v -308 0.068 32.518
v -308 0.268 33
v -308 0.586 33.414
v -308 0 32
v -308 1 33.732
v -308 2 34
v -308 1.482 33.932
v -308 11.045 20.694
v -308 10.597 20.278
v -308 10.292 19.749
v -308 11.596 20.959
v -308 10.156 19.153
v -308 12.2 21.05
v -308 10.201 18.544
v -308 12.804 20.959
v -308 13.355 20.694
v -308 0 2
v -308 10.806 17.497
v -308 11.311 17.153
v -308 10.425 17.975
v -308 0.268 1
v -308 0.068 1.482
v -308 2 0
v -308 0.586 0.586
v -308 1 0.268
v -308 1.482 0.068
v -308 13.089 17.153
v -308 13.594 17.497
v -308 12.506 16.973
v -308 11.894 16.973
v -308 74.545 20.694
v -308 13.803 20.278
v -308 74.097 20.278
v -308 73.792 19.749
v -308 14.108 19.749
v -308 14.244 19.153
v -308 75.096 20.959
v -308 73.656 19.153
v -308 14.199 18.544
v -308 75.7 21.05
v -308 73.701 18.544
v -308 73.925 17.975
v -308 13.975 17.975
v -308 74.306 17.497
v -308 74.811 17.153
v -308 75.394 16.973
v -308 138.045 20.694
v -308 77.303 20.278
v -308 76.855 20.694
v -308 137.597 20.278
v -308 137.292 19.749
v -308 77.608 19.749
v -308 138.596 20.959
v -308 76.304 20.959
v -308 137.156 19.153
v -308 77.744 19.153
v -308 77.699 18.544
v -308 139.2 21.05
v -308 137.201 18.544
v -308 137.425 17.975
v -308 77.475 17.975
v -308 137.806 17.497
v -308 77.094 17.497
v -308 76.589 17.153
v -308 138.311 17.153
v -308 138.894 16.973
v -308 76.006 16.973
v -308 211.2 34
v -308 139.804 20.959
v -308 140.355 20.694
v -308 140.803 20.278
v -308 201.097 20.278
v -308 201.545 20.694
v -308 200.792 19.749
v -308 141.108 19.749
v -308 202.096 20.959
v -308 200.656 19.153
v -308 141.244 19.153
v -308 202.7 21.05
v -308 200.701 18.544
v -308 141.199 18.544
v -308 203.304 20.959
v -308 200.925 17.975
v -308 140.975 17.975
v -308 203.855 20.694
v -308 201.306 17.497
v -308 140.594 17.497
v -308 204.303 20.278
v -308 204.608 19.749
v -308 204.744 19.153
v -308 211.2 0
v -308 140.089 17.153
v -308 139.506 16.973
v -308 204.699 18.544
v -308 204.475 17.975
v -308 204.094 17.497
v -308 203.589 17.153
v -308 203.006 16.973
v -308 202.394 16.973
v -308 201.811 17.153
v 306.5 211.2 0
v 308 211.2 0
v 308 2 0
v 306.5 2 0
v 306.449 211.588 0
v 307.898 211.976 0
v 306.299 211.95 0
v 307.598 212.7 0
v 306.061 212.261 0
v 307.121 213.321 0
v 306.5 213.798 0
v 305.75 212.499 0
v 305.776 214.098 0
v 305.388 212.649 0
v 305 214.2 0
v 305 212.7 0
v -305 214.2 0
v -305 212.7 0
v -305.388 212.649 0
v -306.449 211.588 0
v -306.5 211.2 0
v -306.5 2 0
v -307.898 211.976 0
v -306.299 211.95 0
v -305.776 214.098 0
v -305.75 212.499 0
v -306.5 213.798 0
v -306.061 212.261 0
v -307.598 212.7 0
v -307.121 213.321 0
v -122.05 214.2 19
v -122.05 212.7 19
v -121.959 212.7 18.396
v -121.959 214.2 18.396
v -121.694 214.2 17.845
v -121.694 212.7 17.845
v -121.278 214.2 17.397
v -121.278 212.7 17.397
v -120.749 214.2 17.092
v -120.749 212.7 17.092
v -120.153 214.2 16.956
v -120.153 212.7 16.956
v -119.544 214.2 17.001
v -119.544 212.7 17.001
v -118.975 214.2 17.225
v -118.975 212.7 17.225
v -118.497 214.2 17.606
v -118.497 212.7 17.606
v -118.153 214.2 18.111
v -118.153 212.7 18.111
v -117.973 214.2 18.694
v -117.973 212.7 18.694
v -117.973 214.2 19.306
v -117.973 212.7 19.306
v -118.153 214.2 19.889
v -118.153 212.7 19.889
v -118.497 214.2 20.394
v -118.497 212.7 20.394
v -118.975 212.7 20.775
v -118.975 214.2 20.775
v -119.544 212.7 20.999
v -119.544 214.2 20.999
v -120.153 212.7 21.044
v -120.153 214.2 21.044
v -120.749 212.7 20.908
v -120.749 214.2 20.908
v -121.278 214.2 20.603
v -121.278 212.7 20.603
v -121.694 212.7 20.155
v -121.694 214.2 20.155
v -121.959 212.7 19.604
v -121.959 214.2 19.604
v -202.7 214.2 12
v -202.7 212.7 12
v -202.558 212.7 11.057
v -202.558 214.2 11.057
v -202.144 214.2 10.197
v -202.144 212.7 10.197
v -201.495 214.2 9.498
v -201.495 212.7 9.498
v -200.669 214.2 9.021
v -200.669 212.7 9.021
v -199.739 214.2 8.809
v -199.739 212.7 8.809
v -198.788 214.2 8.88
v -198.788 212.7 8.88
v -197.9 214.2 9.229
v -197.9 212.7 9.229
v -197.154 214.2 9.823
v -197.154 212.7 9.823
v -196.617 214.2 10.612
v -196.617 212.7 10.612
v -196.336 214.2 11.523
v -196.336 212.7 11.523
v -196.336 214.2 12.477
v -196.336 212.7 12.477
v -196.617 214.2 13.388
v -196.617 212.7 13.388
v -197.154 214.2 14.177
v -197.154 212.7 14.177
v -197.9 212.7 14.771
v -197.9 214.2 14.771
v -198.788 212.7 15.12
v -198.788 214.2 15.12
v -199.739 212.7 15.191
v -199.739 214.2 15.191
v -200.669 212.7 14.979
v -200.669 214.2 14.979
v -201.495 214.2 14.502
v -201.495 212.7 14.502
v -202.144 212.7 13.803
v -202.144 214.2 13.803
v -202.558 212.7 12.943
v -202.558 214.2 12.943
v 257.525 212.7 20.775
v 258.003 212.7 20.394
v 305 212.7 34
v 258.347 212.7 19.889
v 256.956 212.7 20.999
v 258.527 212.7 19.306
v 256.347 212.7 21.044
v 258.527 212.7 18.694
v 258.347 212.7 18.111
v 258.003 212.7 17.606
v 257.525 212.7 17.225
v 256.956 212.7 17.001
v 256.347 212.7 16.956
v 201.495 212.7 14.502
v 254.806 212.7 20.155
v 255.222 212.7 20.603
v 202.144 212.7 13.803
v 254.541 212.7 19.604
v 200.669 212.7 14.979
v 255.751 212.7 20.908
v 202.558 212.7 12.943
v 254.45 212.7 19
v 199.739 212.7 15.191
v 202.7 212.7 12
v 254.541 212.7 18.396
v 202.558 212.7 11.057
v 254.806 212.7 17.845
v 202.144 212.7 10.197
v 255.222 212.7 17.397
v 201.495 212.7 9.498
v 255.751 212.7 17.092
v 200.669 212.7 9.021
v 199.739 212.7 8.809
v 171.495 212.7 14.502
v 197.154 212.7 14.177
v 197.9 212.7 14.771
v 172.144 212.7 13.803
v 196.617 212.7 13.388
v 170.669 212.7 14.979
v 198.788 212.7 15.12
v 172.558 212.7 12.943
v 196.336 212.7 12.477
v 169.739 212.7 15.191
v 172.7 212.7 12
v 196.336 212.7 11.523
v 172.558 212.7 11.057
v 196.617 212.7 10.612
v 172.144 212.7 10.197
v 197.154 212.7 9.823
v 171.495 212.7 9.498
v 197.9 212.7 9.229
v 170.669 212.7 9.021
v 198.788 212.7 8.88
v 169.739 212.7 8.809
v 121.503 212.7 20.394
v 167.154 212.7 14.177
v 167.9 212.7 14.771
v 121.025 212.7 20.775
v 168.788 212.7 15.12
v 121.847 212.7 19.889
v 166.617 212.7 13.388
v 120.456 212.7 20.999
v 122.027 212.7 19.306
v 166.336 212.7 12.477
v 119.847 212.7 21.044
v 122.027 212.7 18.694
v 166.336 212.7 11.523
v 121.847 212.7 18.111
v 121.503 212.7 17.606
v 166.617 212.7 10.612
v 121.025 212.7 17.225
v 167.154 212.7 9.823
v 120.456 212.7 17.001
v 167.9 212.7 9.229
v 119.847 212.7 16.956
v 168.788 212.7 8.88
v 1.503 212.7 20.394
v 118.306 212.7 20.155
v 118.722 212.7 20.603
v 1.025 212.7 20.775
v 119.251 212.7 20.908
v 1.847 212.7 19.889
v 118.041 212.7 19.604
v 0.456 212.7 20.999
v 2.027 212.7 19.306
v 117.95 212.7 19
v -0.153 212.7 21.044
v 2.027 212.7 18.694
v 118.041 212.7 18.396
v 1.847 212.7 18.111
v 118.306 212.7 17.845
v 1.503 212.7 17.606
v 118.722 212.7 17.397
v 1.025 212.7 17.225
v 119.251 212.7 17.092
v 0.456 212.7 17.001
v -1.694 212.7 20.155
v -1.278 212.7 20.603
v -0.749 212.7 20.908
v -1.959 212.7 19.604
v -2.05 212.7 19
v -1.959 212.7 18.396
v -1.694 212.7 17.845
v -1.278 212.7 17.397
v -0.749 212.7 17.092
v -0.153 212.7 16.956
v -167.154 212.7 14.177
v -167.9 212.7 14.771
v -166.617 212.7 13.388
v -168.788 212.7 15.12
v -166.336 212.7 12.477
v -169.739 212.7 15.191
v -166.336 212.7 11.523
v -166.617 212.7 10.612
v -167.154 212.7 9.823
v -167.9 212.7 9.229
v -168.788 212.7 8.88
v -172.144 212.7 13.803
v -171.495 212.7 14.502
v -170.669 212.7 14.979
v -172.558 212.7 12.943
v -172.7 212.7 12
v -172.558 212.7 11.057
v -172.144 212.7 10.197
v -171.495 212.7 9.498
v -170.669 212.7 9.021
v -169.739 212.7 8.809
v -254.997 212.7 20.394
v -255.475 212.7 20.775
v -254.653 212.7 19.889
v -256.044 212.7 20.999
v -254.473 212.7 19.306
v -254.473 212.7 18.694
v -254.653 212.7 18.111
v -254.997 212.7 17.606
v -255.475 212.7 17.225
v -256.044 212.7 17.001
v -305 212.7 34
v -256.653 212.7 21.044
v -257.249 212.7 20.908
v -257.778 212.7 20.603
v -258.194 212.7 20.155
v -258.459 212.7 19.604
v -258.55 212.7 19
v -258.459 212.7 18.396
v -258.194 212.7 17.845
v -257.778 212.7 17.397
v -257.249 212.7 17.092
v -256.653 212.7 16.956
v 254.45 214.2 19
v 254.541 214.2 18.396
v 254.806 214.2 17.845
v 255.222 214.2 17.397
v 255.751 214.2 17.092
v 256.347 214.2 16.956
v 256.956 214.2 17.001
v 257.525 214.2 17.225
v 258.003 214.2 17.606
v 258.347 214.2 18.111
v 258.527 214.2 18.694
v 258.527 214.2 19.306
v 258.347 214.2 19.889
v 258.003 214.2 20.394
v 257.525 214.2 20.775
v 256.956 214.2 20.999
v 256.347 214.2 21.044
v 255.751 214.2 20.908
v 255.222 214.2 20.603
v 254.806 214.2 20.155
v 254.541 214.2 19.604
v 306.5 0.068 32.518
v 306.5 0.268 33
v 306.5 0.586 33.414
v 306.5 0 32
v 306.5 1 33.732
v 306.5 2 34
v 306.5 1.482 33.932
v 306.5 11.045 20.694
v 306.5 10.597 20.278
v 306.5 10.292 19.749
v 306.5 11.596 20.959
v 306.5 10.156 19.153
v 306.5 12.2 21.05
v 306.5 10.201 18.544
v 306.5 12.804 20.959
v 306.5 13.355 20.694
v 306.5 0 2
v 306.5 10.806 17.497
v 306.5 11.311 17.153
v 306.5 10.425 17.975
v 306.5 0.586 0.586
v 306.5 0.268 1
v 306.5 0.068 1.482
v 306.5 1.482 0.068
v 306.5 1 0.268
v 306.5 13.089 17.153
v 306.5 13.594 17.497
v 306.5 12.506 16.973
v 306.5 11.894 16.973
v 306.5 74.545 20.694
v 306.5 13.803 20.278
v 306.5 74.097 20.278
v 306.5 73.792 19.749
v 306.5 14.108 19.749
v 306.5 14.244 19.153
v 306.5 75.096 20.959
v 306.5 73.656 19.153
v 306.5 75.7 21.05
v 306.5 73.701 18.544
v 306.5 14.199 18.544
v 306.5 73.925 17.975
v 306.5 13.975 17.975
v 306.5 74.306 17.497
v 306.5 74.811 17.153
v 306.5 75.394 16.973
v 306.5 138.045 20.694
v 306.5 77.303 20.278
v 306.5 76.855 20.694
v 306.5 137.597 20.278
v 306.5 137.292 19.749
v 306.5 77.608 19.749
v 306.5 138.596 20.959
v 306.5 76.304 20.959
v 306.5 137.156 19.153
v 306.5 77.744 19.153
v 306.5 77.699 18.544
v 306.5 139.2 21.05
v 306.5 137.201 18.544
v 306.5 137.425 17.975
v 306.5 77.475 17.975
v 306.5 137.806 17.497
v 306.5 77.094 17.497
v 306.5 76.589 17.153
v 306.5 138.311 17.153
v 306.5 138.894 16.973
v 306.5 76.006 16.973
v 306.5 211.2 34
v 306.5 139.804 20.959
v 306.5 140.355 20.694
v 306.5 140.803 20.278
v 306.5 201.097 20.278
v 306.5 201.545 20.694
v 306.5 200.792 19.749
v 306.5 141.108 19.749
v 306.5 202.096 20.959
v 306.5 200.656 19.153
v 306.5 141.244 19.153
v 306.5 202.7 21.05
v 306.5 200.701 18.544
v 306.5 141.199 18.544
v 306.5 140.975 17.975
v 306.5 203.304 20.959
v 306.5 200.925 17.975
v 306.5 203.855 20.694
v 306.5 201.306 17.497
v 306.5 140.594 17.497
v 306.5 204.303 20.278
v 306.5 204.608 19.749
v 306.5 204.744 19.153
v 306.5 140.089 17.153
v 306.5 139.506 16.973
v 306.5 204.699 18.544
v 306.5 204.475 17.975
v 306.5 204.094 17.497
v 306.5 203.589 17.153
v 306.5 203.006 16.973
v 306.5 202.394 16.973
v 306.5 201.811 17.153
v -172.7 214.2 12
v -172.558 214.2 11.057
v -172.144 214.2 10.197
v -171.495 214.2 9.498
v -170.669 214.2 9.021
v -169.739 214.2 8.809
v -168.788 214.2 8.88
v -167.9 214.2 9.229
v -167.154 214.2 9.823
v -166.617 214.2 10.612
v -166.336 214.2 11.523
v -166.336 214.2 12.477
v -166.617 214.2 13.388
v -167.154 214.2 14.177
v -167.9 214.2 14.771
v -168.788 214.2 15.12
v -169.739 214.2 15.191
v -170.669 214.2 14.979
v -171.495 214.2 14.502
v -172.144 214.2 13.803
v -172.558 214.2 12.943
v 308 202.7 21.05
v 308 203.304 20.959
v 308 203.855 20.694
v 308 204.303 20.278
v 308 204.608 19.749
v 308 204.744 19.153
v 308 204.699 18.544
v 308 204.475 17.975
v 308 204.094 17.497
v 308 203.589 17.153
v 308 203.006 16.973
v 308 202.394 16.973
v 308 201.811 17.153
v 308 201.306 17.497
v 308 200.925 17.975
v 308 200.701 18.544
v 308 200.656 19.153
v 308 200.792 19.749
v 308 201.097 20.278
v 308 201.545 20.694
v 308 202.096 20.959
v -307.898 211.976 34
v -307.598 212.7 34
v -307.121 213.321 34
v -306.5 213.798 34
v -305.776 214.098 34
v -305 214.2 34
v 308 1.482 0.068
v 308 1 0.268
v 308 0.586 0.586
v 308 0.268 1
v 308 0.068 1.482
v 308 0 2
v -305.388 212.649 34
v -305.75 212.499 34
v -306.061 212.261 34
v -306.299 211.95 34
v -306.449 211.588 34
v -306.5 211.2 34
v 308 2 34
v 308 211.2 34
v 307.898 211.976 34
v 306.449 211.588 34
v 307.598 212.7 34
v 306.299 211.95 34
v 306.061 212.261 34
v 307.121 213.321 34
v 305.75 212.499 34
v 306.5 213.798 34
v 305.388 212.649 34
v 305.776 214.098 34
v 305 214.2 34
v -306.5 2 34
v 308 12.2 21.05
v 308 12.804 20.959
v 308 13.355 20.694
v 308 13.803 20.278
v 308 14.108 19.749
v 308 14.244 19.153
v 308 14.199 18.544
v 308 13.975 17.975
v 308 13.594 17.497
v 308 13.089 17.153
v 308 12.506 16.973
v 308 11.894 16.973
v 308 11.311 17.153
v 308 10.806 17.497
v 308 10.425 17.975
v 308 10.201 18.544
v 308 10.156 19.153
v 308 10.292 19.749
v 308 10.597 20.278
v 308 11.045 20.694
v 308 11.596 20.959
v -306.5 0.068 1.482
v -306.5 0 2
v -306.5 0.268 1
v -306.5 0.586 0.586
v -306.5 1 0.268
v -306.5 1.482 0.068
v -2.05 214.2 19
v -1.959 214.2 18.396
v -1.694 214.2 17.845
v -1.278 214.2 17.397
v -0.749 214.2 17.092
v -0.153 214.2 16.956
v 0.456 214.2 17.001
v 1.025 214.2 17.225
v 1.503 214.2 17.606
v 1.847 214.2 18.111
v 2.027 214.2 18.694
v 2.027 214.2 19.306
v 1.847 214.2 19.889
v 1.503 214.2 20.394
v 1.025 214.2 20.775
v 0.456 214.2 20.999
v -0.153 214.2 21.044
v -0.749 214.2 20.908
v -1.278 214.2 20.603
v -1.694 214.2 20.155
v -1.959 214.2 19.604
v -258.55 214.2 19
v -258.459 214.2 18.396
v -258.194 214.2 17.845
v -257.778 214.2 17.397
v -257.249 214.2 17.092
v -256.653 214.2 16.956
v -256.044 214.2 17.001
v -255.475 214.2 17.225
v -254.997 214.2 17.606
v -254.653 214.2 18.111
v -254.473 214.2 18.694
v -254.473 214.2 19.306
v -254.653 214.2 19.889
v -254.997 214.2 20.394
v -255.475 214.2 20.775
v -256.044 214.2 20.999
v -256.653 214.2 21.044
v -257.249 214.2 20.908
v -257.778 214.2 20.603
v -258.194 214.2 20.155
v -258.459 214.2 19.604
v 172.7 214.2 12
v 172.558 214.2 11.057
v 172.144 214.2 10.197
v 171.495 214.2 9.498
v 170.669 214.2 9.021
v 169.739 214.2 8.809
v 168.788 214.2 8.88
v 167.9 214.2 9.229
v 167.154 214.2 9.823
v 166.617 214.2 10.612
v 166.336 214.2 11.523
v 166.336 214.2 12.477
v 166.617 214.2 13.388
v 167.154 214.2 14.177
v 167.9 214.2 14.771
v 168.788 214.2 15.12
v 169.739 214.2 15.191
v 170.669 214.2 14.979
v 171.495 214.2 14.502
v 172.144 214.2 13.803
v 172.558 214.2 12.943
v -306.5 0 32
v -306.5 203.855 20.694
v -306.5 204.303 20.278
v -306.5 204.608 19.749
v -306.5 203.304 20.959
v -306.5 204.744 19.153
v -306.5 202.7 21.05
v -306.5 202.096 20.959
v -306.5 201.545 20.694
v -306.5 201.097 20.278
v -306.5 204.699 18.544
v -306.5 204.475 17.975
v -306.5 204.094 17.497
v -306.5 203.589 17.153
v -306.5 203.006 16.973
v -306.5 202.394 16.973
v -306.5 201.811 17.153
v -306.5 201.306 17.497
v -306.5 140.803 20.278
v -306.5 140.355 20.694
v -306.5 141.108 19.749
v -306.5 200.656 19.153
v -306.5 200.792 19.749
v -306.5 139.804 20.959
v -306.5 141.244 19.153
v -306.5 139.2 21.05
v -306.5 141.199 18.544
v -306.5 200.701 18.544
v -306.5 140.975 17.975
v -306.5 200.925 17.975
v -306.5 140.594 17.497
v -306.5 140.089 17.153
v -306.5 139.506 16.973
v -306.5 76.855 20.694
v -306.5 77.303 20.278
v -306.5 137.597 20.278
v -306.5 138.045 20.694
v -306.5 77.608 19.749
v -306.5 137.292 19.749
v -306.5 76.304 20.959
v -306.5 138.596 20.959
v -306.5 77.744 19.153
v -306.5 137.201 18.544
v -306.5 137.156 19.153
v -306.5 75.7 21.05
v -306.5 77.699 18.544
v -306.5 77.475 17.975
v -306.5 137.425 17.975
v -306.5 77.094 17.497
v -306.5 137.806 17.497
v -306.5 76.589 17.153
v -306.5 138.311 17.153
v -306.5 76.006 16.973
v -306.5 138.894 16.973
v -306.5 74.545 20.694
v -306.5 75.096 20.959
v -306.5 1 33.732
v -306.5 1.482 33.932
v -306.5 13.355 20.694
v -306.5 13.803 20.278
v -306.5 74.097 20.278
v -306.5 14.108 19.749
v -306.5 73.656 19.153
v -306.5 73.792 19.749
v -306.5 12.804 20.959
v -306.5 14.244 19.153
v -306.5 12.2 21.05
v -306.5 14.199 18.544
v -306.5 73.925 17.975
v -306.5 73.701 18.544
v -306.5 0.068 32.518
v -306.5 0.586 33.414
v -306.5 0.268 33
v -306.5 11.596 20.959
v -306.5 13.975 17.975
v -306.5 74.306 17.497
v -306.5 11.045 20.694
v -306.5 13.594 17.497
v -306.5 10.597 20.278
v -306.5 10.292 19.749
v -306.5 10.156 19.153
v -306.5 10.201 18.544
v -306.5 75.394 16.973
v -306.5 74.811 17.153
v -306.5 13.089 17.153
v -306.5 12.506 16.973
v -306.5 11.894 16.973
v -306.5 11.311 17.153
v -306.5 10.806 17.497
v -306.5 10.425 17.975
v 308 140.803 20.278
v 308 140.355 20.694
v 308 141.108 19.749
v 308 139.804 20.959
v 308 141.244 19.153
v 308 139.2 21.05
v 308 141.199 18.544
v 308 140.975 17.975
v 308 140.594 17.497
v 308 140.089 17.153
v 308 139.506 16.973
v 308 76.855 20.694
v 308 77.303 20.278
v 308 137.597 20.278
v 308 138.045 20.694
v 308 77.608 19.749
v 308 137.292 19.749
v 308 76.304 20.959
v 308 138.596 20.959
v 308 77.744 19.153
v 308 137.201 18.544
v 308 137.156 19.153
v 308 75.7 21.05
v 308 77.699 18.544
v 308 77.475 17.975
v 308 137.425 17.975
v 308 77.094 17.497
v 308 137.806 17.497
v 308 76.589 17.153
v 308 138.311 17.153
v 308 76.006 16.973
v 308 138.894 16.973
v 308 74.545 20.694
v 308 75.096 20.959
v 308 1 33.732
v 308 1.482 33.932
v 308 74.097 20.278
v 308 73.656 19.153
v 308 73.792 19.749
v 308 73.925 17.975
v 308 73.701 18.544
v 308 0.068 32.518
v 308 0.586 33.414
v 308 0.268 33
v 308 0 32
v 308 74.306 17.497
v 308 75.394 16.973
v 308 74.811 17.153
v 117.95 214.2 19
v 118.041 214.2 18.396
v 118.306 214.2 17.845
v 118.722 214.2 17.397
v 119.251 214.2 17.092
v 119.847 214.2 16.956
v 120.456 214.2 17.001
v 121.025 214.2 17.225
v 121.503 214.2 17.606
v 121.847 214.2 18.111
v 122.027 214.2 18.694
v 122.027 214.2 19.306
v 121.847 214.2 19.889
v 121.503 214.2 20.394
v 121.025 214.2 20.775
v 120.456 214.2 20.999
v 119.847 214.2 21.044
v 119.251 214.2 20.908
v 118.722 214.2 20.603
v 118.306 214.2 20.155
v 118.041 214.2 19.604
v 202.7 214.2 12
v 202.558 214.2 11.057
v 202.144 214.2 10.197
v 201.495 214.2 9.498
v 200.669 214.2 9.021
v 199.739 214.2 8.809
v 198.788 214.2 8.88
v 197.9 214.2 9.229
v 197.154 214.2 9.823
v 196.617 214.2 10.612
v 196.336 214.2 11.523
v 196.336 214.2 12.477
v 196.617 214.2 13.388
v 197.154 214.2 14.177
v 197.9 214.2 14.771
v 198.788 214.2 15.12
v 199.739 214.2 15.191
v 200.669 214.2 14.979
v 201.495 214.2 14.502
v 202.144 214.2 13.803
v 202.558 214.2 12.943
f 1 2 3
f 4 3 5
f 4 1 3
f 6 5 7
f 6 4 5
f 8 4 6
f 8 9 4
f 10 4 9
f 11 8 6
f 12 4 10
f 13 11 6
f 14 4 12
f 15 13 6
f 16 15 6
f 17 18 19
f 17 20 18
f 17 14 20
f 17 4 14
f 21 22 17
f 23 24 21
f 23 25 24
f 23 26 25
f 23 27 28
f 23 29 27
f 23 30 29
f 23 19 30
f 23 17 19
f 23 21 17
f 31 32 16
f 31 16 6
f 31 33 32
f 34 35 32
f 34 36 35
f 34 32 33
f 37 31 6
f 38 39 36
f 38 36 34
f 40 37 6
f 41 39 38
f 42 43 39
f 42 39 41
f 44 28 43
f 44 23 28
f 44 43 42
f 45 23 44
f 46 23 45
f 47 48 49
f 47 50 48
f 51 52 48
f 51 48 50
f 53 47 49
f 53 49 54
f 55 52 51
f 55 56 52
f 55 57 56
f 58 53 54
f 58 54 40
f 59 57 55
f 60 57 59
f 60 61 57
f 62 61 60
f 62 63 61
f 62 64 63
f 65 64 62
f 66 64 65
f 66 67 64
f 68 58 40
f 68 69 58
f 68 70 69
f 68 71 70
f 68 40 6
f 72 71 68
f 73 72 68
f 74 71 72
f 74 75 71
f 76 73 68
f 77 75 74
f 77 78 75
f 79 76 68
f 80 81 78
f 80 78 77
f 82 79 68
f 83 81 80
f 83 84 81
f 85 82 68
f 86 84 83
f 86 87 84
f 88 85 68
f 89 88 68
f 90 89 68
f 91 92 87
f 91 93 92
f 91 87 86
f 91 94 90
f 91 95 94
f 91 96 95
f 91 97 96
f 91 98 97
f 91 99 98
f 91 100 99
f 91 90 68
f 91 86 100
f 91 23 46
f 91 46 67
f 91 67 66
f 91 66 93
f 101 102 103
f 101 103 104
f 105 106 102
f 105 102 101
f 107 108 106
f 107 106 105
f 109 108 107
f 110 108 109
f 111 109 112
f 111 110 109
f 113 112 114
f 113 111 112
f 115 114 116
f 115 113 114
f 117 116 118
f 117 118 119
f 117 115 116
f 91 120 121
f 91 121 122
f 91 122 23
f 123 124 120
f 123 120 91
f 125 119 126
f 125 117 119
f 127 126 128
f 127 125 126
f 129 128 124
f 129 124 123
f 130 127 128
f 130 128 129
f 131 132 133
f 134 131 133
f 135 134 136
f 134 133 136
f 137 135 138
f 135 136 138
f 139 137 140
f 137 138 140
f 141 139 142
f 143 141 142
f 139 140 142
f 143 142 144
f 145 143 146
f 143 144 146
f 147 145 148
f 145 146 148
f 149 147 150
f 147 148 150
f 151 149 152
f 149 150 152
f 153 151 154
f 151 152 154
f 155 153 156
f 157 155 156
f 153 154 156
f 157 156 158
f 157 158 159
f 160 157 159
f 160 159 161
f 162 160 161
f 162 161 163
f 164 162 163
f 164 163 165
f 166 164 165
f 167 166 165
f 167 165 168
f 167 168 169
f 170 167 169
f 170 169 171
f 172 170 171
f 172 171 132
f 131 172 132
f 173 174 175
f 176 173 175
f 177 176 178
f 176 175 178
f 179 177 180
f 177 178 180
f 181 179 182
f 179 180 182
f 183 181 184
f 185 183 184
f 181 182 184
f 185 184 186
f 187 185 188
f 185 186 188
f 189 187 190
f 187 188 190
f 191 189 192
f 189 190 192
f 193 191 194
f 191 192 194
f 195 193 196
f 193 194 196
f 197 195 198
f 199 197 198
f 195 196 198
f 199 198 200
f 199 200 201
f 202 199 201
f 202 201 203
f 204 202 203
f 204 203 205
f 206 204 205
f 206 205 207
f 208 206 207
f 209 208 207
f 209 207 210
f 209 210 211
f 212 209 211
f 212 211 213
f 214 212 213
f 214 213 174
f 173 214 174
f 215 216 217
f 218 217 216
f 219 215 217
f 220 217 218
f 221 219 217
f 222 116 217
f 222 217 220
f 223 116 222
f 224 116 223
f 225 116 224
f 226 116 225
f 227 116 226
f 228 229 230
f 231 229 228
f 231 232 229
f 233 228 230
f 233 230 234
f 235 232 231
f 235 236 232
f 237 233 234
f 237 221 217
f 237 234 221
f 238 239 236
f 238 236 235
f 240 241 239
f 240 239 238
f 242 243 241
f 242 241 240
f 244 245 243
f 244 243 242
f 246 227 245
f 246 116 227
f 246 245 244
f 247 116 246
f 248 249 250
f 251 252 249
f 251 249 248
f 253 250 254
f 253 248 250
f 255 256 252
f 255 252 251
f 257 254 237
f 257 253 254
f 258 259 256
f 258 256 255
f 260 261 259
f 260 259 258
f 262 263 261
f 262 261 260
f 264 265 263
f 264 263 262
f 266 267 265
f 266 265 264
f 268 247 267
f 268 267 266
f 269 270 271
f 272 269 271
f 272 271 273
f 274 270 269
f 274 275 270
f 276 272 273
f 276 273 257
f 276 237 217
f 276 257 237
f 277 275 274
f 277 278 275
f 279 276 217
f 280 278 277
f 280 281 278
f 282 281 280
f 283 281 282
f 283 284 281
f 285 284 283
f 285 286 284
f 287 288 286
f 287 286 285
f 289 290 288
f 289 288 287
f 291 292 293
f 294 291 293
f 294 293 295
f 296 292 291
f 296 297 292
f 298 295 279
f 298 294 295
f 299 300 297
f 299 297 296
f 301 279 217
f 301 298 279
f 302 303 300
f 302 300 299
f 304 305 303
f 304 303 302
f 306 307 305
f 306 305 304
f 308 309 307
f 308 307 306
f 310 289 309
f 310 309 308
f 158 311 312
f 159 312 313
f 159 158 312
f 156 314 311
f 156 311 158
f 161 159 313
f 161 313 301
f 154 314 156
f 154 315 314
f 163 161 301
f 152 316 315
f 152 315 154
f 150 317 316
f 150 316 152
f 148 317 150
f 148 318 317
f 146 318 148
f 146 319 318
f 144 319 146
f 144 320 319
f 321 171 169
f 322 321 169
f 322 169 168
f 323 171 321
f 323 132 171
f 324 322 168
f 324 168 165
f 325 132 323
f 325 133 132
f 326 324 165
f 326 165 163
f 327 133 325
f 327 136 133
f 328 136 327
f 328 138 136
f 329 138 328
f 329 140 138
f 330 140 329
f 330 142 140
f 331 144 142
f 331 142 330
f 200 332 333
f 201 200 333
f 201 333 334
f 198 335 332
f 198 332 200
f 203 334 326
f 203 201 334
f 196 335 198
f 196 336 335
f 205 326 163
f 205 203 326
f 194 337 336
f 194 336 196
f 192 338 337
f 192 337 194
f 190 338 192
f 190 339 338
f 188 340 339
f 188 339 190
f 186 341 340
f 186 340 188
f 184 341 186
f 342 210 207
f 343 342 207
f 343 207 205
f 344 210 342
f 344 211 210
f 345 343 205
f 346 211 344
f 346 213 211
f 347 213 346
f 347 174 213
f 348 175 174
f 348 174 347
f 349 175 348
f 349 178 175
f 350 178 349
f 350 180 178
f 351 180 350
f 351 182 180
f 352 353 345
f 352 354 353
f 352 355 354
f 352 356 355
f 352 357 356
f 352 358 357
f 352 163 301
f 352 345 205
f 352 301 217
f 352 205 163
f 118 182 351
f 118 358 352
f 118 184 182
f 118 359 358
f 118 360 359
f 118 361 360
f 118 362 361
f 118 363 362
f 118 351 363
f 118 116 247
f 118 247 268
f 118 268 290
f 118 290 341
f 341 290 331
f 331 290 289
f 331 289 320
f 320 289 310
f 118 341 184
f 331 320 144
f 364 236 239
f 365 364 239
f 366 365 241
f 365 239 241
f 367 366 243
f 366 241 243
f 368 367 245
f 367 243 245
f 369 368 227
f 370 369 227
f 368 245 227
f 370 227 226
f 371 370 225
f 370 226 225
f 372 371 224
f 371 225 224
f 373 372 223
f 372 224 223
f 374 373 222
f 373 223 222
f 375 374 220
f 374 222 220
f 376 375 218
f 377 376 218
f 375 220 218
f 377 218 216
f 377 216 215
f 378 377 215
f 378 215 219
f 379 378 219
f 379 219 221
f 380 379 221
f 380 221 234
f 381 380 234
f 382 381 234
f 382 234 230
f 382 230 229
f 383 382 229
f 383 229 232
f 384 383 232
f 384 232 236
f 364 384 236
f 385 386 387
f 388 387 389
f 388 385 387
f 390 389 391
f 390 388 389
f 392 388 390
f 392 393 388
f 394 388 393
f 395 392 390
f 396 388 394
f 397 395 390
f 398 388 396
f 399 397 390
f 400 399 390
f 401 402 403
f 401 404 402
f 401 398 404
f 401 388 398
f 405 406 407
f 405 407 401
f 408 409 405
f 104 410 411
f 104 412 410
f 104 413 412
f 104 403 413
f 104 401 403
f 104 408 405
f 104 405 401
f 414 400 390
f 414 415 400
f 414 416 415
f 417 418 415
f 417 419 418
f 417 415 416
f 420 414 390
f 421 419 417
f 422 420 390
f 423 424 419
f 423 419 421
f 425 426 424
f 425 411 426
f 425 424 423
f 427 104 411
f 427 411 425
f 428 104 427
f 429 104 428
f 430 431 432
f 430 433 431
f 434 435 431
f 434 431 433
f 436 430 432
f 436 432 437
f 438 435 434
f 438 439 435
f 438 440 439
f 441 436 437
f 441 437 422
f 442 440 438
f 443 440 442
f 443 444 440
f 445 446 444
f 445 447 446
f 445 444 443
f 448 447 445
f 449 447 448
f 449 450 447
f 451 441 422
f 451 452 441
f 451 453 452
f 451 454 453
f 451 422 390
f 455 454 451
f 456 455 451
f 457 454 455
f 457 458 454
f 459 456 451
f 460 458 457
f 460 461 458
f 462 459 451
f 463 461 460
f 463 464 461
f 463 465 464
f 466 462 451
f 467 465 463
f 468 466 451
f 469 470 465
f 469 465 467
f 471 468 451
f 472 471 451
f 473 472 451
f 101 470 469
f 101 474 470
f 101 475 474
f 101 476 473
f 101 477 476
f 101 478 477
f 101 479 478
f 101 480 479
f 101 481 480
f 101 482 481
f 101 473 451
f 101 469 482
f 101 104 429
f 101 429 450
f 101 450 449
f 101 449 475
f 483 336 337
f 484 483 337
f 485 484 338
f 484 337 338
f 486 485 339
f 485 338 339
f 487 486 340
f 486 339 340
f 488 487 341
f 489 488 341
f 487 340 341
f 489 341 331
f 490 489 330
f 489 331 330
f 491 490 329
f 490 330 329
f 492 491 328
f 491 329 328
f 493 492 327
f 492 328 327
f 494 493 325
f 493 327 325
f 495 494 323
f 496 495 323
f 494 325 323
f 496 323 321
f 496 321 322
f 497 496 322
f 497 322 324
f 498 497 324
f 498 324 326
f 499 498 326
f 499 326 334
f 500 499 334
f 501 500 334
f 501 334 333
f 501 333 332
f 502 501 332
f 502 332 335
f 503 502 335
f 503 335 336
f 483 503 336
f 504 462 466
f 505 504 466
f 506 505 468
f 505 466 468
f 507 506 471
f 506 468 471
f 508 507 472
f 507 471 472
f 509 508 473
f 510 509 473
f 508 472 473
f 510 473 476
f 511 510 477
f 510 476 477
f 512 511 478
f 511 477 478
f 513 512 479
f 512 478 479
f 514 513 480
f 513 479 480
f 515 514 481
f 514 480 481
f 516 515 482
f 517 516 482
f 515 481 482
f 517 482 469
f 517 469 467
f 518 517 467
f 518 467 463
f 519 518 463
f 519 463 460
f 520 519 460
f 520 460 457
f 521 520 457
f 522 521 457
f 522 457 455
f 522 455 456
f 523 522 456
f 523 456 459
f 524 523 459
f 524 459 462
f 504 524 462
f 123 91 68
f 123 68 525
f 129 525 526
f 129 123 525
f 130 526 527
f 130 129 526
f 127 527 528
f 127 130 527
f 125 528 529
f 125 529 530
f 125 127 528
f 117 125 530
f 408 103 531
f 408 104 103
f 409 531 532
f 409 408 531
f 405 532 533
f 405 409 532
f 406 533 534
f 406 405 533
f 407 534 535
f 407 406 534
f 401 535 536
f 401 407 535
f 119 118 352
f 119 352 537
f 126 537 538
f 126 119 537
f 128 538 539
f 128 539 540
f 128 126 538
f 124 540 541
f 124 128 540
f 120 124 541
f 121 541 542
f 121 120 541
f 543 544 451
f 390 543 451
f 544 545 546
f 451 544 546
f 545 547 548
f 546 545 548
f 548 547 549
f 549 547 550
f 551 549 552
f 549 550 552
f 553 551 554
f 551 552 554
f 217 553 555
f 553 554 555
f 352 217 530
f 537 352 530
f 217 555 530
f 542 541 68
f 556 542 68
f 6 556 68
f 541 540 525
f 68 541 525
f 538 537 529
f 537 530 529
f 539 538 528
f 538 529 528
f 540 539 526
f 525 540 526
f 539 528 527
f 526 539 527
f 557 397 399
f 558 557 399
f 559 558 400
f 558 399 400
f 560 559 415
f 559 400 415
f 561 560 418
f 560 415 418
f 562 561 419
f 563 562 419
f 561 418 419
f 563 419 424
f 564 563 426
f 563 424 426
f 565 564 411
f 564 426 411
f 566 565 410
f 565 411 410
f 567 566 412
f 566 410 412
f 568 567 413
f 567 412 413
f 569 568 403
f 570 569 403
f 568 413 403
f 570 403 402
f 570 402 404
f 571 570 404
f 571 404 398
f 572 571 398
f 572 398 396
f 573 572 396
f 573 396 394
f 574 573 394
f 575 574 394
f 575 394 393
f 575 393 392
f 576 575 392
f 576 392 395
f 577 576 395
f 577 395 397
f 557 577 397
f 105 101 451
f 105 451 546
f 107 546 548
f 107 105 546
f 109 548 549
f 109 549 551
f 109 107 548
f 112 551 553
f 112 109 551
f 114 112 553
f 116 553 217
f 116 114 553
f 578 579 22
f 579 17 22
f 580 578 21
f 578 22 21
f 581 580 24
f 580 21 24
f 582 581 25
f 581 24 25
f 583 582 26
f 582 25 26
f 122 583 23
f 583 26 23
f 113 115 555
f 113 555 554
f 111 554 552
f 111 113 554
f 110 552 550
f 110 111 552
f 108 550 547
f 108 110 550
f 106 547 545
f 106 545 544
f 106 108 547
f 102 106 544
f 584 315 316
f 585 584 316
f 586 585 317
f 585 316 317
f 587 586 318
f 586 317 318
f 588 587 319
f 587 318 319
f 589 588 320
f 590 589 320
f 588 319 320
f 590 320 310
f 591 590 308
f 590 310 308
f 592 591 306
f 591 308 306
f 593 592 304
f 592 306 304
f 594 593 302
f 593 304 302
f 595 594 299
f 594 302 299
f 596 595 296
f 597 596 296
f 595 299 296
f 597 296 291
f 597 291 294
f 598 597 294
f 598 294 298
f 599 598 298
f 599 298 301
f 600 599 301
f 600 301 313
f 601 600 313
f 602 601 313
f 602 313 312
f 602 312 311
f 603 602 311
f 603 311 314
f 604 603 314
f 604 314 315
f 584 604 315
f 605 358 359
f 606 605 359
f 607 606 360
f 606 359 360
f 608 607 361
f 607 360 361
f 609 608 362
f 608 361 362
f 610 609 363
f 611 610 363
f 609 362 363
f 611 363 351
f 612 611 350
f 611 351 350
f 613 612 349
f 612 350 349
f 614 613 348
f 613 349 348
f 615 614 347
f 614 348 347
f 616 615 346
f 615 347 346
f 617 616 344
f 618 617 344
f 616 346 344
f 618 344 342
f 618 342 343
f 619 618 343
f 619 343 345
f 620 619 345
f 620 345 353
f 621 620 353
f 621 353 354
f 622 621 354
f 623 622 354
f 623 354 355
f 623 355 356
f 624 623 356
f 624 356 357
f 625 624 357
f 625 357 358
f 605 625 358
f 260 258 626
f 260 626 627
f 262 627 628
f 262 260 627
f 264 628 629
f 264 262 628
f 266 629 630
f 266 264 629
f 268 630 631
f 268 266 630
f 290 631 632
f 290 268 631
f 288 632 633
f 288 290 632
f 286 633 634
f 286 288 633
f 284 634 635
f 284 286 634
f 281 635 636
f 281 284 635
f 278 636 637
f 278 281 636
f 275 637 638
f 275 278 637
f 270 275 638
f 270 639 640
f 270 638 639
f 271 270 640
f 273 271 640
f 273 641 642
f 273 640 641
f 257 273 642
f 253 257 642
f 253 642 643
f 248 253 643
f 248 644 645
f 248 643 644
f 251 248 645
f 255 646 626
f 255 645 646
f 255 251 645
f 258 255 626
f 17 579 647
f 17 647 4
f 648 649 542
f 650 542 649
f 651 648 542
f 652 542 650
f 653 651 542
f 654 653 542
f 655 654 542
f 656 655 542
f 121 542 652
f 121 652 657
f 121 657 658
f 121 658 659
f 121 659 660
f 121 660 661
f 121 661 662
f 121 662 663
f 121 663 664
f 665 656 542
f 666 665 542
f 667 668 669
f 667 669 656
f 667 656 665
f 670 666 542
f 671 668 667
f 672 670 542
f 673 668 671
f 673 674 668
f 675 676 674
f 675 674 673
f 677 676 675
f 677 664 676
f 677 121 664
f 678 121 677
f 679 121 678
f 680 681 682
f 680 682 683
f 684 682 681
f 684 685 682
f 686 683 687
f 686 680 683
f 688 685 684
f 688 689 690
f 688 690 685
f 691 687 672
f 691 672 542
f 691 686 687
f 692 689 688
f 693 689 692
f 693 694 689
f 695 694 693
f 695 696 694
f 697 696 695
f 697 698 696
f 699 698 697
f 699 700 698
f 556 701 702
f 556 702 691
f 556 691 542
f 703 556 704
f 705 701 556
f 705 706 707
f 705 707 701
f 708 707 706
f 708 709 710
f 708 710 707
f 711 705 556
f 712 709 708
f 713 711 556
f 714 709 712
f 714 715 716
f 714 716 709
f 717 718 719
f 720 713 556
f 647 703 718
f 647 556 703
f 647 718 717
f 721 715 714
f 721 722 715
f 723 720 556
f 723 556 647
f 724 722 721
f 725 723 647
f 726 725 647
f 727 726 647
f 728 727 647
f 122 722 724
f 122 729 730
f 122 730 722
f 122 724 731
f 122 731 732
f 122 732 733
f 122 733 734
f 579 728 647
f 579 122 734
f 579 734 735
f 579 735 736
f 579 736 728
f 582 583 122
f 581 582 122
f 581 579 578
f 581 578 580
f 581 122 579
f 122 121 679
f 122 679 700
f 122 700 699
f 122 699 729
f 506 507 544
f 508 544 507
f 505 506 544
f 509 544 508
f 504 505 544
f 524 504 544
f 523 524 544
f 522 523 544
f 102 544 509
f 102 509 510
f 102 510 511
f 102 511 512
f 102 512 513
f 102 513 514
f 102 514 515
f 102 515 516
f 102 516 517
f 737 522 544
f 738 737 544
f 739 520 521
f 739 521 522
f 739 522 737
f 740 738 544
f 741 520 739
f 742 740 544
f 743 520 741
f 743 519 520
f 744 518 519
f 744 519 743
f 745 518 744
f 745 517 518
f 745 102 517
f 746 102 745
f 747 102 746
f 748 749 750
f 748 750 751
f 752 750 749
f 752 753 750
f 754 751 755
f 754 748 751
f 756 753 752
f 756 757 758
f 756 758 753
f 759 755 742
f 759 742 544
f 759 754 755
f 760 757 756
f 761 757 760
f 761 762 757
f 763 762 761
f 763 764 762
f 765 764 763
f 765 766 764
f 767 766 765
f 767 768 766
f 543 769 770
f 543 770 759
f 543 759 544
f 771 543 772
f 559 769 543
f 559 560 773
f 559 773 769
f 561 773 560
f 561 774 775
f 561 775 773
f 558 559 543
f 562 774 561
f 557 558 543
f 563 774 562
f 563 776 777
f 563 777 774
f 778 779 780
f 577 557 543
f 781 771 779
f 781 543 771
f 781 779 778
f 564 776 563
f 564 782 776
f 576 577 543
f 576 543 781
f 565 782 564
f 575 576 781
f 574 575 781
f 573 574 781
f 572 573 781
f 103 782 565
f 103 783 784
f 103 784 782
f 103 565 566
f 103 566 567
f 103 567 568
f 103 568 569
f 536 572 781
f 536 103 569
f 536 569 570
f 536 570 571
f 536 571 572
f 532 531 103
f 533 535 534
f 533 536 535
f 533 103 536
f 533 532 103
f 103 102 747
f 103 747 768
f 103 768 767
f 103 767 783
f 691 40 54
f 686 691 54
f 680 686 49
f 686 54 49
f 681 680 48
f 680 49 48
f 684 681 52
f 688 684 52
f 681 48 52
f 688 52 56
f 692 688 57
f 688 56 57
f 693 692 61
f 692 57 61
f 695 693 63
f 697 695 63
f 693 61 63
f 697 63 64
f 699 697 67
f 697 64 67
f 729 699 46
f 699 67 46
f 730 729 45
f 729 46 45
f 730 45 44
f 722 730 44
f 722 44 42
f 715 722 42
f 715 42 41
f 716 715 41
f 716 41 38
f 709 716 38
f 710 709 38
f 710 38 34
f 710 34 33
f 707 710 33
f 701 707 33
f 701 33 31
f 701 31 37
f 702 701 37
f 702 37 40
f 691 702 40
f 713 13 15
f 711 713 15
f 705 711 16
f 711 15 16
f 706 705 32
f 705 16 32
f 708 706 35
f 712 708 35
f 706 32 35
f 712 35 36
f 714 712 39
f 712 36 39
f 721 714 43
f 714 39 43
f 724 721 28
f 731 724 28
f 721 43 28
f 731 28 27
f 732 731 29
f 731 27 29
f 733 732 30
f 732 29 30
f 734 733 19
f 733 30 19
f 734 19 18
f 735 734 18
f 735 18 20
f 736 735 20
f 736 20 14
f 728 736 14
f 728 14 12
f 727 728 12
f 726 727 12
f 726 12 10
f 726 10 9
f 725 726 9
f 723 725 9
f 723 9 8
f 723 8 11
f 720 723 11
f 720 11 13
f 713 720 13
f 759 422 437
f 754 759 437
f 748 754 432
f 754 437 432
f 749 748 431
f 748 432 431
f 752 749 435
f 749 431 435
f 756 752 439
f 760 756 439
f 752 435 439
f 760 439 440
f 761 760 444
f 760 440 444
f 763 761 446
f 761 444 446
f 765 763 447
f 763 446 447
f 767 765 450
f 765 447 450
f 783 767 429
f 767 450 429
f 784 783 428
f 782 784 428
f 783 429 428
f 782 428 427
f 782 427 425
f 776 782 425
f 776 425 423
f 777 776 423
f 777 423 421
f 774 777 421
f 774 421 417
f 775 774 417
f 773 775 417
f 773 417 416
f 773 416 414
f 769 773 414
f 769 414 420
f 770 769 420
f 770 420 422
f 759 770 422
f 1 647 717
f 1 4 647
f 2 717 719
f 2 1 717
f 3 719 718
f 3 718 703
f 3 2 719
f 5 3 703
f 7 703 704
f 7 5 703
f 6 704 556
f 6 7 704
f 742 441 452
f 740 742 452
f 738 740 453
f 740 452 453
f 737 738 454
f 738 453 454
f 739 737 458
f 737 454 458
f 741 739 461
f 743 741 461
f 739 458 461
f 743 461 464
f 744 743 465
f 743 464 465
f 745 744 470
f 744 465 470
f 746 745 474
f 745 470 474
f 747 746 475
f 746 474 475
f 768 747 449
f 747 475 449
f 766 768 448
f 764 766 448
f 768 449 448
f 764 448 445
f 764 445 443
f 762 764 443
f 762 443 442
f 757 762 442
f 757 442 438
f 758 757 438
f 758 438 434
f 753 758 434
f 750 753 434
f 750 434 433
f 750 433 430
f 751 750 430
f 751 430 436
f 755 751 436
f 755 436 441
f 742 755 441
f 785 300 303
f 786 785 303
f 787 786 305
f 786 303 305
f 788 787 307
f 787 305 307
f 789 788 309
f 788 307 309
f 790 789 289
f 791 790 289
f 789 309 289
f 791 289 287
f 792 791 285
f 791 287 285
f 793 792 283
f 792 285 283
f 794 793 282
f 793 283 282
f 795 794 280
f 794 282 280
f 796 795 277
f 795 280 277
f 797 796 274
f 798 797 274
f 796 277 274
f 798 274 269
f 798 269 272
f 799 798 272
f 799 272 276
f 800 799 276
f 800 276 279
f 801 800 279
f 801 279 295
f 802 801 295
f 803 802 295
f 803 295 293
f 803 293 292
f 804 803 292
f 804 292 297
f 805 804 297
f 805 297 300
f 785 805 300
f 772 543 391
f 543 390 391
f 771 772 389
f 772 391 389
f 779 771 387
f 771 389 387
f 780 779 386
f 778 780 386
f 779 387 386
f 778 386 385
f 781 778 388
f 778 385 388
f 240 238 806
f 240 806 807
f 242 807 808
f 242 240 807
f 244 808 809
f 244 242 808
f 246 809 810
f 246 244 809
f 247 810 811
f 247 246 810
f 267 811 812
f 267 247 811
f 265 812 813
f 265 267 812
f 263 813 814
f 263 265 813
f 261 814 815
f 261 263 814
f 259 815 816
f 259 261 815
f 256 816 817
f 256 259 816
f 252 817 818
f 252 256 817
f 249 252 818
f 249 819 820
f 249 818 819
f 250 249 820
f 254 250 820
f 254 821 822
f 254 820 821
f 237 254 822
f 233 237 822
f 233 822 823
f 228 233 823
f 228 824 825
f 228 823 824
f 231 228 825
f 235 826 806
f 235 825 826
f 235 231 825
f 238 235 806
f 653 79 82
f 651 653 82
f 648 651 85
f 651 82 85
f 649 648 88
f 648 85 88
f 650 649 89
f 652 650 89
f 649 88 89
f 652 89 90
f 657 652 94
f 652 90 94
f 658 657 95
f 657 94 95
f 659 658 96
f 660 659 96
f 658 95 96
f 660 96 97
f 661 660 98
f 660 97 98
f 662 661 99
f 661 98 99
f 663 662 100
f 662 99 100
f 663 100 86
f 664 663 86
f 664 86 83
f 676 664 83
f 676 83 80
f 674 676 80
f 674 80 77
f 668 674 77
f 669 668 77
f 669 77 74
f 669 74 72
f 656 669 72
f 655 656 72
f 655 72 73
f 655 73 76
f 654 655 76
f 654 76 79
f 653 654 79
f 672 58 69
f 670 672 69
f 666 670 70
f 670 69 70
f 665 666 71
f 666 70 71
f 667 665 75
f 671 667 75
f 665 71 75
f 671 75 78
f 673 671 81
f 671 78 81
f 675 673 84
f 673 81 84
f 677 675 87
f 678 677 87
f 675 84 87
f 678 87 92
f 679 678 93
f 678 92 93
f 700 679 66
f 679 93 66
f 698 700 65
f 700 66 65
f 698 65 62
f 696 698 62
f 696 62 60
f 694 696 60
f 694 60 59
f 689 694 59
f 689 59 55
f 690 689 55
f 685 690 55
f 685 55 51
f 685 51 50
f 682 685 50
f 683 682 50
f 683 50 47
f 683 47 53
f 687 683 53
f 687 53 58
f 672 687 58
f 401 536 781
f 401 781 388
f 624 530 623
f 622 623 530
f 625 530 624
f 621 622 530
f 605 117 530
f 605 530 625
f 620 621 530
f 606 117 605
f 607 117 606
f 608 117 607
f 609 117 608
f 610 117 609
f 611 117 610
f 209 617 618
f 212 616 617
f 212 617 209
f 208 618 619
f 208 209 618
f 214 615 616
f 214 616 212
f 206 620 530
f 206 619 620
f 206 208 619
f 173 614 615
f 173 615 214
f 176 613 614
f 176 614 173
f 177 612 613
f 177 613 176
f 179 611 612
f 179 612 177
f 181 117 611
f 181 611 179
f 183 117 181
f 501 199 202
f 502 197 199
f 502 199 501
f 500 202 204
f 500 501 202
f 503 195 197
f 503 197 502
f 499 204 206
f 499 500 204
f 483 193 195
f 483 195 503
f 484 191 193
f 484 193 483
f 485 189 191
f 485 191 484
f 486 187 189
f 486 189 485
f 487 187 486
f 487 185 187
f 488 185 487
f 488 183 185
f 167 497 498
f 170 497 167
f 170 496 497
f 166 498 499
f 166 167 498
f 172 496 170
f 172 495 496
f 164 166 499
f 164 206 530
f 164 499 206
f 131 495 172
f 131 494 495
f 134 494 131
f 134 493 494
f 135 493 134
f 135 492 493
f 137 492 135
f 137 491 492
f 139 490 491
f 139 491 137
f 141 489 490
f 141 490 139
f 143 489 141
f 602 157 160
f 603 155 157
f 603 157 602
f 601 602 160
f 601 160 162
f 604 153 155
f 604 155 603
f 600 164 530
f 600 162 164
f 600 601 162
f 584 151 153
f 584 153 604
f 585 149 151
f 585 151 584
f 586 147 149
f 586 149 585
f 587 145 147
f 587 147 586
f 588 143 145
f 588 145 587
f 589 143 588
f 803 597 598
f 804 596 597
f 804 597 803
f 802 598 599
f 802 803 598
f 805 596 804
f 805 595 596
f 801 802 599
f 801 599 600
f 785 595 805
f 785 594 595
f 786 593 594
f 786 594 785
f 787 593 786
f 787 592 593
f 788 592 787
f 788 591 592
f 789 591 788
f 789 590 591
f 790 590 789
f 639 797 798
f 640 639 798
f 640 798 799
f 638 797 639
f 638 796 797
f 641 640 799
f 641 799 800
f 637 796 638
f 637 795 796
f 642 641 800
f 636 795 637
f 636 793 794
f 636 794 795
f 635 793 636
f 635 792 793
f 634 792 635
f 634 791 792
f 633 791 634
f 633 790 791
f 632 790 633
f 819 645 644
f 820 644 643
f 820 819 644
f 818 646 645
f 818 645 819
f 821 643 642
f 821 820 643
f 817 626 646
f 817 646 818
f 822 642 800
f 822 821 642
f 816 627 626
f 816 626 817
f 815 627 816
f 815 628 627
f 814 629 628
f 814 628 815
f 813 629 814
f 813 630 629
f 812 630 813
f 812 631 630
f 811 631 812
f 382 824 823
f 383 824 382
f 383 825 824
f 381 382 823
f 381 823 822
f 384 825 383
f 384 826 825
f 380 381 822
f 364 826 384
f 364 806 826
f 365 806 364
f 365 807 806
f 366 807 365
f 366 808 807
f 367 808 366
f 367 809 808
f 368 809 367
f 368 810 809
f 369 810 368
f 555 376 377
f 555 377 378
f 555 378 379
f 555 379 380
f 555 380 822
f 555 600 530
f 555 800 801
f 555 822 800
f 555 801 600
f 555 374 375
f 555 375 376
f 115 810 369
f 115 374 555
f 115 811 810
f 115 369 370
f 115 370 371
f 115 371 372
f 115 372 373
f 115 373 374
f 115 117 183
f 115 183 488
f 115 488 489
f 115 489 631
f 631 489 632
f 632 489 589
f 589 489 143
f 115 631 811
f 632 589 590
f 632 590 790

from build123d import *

# Parameters (mm, degrees)
BASE_FLANGE1_DEPTH         = 34
SKETCH2_R                  = 2.05
CUT_EXTRUDE1_DEPTH         = 654.06480536
M6_CLEARANCE_HOLE1_D       = 6.4
FILLET1_R                  = 2
F_4_1_4_1_DIAMETER_HOLE1_D = 4.1


# Sheet-metal steps are written as plain solids
with BuildPart() as part:
    # Sketch1 → Base-Flange1 (new body)
    with BuildSketch(Plane.XY):
        with BuildLine():
            Line((-308, 0), (-308, 211.2))
            ThreePointArc((-308, 211.2), (-307.121320344, 213.321320344), (-305, 214.2))
            Line((-305, 214.2), (305, 214.2))
            ThreePointArc((305, 214.2), (307.121320344, 213.321320344), (308, 211.2))
            Line((308, 211.2), (308, 0))
            Line((308, 0), (306.5, 0))
            Line((306.5, 0), (306.5, 211.2))
            ThreePointArc((306.5, 211.2), (306.060660172, 212.260660172), (305, 212.7))
            Line((305, 212.7), (-305, 212.7))
            ThreePointArc((-305, 212.7), (-306.060660172, 212.260660172), (-306.5, 211.2))
            Line((-306.5, 211.2), (-306.5, 0))
            Line((-306.5, 0), (-308, 0))
        make_face()
    extrude(amount=BASE_FLANGE1_DEPTH)

    # Sketch2 → Cut-Extrude1 (cut, through all)
    with BuildSketch(Plane.ZY.offset(308)):
        with Locations((19, 12.2)):
            Circle(SKETCH2_R)
        with Locations((19, 75.7)):
            Circle(SKETCH2_R)
        with Locations((19, 139.2)):
            Circle(SKETCH2_R)
        with Locations((19, 202.7)):
            Circle(SKETCH2_R)
    extrude(amount=-CUT_EXTRUDE1_DEPTH, mode=Mode.SUBTRACT)

    # M6 Clearance Hole1 (through all)
    with Locations(Plane(origin=(0, 214.2, 0), x_dir=(1, 0, 0), z_dir=(0, 1, 0))):
        with Locations((-199.5, -12), (-169.5, -12)):
            m6_clearance_hole1 = Hole(M6_CLEARANCE_HOLE1_D / 2)

    # Fillet1
    fillet1_edges = [part.edges().sort_by_distance(p)[0] for p in [
        (-307.25, 0, 0),
        (307.25, 0, 0),
        (-307.25, 0, 34),
        (307.25, 0, 34),
    ]]
    fillet(fillet1_edges, radius=FILLET1_R)

    # Ø4.1 (4.1) Diameter Hole1 (through all)
    with Locations(Plane(origin=(0, 214.2, 0), x_dir=(1, 0, 0), z_dir=(0, 1, 0))):
        with Locations((-256.5, -19), (-120, -19), (0, -19), (120, -19), (256.5, -19)):
            Hole(F_4_1_4_1_DIAMETER_HOLE1_D / 2)

    # Mirror1: M6 Clearance Hole1 across Right Plane
    add(m6_clearance_hole1.mirror(Plane(origin=(0, 0, 0), x_dir=(0, 0, -1), z_dir=(1, 0, 0))), mode=Mode.SUBTRACT)


solid = part.part
